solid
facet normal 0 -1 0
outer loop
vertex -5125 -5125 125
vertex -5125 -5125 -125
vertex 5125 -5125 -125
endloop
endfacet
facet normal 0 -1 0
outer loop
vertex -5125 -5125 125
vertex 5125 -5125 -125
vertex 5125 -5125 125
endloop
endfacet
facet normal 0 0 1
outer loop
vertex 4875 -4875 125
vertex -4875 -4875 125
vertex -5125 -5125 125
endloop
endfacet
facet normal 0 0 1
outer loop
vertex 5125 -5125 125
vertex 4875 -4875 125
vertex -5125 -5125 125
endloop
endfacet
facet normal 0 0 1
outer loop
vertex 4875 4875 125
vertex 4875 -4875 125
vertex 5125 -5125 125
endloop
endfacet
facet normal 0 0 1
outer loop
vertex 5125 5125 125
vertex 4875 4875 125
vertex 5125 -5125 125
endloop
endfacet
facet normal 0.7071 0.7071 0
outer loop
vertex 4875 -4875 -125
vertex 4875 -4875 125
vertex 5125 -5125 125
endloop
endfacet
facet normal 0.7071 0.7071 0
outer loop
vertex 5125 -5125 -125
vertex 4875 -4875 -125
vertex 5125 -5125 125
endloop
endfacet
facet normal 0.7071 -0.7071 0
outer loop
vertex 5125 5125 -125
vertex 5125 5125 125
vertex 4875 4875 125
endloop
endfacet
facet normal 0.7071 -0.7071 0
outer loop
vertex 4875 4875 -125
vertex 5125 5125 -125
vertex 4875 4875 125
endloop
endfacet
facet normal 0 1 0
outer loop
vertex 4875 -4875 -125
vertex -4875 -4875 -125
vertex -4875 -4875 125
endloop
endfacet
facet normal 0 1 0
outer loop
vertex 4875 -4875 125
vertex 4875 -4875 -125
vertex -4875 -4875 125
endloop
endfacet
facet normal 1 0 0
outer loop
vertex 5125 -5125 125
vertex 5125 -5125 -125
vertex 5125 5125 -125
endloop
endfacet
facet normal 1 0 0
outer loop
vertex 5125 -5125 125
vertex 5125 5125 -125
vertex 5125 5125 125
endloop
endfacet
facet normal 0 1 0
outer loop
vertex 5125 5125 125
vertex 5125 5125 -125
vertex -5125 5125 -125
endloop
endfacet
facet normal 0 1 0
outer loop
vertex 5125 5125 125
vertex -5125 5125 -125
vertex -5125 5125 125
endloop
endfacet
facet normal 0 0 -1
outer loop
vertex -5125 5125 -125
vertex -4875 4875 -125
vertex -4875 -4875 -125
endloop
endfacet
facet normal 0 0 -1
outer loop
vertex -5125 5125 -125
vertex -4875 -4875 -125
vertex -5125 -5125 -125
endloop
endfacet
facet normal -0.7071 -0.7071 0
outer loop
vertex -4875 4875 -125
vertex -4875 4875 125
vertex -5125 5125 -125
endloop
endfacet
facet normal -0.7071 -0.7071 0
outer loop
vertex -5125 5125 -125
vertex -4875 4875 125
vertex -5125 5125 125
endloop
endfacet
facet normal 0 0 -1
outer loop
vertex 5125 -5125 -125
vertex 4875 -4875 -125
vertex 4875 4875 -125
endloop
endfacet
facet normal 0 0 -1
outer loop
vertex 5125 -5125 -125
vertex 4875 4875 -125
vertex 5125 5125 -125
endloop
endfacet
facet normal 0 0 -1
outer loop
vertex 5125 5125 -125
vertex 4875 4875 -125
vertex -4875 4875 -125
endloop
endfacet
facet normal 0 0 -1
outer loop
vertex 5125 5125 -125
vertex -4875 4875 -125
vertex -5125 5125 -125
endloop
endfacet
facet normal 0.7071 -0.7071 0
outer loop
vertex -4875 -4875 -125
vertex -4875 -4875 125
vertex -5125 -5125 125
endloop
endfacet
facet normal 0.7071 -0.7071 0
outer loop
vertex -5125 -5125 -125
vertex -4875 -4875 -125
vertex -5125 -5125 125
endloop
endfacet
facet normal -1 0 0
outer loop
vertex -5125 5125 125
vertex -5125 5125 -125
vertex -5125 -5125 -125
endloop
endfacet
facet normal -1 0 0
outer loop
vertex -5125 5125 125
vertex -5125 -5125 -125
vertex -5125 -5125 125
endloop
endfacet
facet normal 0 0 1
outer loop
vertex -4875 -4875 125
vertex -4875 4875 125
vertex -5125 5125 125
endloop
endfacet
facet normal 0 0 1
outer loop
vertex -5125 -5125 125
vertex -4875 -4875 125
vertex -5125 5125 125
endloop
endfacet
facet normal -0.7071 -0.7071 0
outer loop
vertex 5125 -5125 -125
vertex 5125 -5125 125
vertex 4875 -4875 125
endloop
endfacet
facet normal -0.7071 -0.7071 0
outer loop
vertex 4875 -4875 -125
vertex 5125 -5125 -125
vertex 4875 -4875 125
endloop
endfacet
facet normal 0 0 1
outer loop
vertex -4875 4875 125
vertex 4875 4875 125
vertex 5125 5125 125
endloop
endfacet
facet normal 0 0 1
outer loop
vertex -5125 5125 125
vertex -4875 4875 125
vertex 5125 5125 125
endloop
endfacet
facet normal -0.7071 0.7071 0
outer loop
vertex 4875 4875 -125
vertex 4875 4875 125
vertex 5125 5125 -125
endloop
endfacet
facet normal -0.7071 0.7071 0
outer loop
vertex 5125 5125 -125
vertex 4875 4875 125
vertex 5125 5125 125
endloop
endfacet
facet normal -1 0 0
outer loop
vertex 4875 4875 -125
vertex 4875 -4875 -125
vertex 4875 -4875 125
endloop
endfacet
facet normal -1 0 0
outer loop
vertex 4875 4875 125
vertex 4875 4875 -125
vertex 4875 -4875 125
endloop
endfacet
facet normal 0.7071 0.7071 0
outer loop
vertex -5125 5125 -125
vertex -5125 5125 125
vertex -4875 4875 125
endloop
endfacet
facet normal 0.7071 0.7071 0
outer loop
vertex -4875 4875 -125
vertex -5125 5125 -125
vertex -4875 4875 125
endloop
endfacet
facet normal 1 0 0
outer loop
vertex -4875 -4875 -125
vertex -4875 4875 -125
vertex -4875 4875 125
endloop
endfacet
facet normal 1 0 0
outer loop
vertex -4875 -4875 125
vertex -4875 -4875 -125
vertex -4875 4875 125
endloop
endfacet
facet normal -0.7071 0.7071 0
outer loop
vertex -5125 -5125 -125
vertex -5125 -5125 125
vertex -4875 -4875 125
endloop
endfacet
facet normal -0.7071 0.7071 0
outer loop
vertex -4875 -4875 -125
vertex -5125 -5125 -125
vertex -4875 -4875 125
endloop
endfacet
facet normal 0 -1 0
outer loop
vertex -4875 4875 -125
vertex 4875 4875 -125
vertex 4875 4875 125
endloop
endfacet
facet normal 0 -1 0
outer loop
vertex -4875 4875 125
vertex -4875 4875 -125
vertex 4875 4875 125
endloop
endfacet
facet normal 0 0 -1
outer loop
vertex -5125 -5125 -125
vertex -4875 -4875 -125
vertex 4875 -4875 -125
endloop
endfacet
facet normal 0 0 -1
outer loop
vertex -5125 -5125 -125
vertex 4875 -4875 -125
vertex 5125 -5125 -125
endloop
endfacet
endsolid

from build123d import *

# Parameters (mm, degrees)
STRUCTURAL_MEMBER1_DEPTH      = 10177.776695297
STRUCTURAL_MEMBER1_DEPTH_BACK = 177.776695297
SKETCH11_W                    = 250
SKETCH11_H                    = 250
SKETCH11_ON_SEGMENT_2_W       = 250
SKETCH11_ON_SEGMENT_2_H       = 250
STRUCTURAL_MEMBER1_2_DEPTH    = 10355.553390593
SKETCH11_ON_SEGMENT_3_W       = 250
SKETCH11_ON_SEGMENT_3_H       = 250
STRUCTURAL_MEMBER1_3_DEPTH    = 10355.553390593
SKETCH11_ON_SEGMENT_4_W       = 250
SKETCH11_ON_SEGMENT_4_H       = 250
STRUCTURAL_MEMBER1_4_DEPTH    = 10355.553390593


with BuildPart() as part:
    # Sketch11 → Structural Member1 (new, two sides: drawn at the far end of the back side and taken through both)
    with BuildSketch(Plane(origin=(-5000, -5000, 0), x_dir=(-1, 0, 0), z_dir=(0, 1, 0)).offset(-STRUCTURAL_MEMBER1_DEPTH_BACK)):
        Rectangle(SKETCH11_W, SKETCH11_H)
    extrude(amount=STRUCTURAL_MEMBER1_DEPTH + STRUCTURAL_MEMBER1_DEPTH_BACK)

    # Structural Member1 mitre 1
    split(bisect_by=Plane(origin=(-5000, -5000, 0), x_dir=(-0.707106781, -0.707106781, 0), z_dir=(-0.707106781, 0.707106781, 0)), keep=Keep.TOP)

    # Structural Member1 mitre 2
    split(bisect_by=Plane(origin=(-5000, 5000, 0), x_dir=(0.707106781, -0.707106781, 0), z_dir=(-0.707106781, -0.707106781, 0)), keep=Keep.TOP)


with BuildPart() as body_2:
    # Sketch11 on segment 2 (carried to segment 2) → Structural Member1 2 (new body)
    with BuildSketch(Plane(origin=(-5177.776695297, 5000, 0), x_dir=(0, 1, 0), z_dir=(1, 0, 0))):
        Rectangle(SKETCH11_ON_SEGMENT_2_W, SKETCH11_ON_SEGMENT_2_H)
    extrude(amount=STRUCTURAL_MEMBER1_2_DEPTH)

    # Structural Member1 2 mitre 1
    split(bisect_by=Plane(origin=(5000, 5000, 0), x_dir=(-0.707106781, -0.707106781, 0), z_dir=(-0.707106781, 0.707106781, 0)), keep=Keep.TOP)

    # Structural Member1 2 mitre 2
    split(bisect_by=Plane(origin=(-5000, 5000, 0), x_dir=(-0.707106781, 0.707106781, 0), z_dir=(0.707106781, 0.707106781, 0)), keep=Keep.TOP)


with BuildPart() as body_3:
    # Sketch11 on segment 3 (carried to segment 3) → Structural Member1 3 (new body)
    with BuildSketch(Plane(origin=(5000, 5177.776695297, 0), x_dir=(1, 0, 0), z_dir=(0, -1, 0))):
        Rectangle(SKETCH11_ON_SEGMENT_3_W, SKETCH11_ON_SEGMENT_3_H)
    extrude(amount=STRUCTURAL_MEMBER1_3_DEPTH)

    # Structural Member1 3 mitre 1
    split(bisect_by=Plane(origin=(5000, -5000, 0), x_dir=(-0.707106781, 0.707106781, 0), z_dir=(0.707106781, 0.707106781, 0)), keep=Keep.TOP)

    # Structural Member1 3 mitre 2
    split(bisect_by=Plane(origin=(5000, 5000, 0), x_dir=(0.707106781, 0.707106781, 0), z_dir=(0.707106781, -0.707106781, 0)), keep=Keep.TOP)


with BuildPart() as body_4:
    # Sketch11 on segment 4 (carried to segment 4) → Structural Member1 4 (new body)
    with BuildSketch(Plane(origin=(5177.776695297, -5000, 0), x_dir=(0, -1, 0), z_dir=(-1, 0, 0))):
        Rectangle(SKETCH11_ON_SEGMENT_4_W, SKETCH11_ON_SEGMENT_4_H)
    extrude(amount=STRUCTURAL_MEMBER1_4_DEPTH)

    # Structural Member1 4 mitre 1
    split(bisect_by=Plane(origin=(5000, -5000, 0), x_dir=(0.707106781, -0.707106781, 0), z_dir=(-0.707106781, -0.707106781, 0)), keep=Keep.TOP)

    # Structural Member1 4 mitre 2
    split(bisect_by=Plane(origin=(-5000, -5000, 0), x_dir=(0.707106781, 0.707106781, 0), z_dir=(0.707106781, -0.707106781, 0)), keep=Keep.TOP)


solid = Compound([part.part, body_2.part, body_3.part, body_4.part])
